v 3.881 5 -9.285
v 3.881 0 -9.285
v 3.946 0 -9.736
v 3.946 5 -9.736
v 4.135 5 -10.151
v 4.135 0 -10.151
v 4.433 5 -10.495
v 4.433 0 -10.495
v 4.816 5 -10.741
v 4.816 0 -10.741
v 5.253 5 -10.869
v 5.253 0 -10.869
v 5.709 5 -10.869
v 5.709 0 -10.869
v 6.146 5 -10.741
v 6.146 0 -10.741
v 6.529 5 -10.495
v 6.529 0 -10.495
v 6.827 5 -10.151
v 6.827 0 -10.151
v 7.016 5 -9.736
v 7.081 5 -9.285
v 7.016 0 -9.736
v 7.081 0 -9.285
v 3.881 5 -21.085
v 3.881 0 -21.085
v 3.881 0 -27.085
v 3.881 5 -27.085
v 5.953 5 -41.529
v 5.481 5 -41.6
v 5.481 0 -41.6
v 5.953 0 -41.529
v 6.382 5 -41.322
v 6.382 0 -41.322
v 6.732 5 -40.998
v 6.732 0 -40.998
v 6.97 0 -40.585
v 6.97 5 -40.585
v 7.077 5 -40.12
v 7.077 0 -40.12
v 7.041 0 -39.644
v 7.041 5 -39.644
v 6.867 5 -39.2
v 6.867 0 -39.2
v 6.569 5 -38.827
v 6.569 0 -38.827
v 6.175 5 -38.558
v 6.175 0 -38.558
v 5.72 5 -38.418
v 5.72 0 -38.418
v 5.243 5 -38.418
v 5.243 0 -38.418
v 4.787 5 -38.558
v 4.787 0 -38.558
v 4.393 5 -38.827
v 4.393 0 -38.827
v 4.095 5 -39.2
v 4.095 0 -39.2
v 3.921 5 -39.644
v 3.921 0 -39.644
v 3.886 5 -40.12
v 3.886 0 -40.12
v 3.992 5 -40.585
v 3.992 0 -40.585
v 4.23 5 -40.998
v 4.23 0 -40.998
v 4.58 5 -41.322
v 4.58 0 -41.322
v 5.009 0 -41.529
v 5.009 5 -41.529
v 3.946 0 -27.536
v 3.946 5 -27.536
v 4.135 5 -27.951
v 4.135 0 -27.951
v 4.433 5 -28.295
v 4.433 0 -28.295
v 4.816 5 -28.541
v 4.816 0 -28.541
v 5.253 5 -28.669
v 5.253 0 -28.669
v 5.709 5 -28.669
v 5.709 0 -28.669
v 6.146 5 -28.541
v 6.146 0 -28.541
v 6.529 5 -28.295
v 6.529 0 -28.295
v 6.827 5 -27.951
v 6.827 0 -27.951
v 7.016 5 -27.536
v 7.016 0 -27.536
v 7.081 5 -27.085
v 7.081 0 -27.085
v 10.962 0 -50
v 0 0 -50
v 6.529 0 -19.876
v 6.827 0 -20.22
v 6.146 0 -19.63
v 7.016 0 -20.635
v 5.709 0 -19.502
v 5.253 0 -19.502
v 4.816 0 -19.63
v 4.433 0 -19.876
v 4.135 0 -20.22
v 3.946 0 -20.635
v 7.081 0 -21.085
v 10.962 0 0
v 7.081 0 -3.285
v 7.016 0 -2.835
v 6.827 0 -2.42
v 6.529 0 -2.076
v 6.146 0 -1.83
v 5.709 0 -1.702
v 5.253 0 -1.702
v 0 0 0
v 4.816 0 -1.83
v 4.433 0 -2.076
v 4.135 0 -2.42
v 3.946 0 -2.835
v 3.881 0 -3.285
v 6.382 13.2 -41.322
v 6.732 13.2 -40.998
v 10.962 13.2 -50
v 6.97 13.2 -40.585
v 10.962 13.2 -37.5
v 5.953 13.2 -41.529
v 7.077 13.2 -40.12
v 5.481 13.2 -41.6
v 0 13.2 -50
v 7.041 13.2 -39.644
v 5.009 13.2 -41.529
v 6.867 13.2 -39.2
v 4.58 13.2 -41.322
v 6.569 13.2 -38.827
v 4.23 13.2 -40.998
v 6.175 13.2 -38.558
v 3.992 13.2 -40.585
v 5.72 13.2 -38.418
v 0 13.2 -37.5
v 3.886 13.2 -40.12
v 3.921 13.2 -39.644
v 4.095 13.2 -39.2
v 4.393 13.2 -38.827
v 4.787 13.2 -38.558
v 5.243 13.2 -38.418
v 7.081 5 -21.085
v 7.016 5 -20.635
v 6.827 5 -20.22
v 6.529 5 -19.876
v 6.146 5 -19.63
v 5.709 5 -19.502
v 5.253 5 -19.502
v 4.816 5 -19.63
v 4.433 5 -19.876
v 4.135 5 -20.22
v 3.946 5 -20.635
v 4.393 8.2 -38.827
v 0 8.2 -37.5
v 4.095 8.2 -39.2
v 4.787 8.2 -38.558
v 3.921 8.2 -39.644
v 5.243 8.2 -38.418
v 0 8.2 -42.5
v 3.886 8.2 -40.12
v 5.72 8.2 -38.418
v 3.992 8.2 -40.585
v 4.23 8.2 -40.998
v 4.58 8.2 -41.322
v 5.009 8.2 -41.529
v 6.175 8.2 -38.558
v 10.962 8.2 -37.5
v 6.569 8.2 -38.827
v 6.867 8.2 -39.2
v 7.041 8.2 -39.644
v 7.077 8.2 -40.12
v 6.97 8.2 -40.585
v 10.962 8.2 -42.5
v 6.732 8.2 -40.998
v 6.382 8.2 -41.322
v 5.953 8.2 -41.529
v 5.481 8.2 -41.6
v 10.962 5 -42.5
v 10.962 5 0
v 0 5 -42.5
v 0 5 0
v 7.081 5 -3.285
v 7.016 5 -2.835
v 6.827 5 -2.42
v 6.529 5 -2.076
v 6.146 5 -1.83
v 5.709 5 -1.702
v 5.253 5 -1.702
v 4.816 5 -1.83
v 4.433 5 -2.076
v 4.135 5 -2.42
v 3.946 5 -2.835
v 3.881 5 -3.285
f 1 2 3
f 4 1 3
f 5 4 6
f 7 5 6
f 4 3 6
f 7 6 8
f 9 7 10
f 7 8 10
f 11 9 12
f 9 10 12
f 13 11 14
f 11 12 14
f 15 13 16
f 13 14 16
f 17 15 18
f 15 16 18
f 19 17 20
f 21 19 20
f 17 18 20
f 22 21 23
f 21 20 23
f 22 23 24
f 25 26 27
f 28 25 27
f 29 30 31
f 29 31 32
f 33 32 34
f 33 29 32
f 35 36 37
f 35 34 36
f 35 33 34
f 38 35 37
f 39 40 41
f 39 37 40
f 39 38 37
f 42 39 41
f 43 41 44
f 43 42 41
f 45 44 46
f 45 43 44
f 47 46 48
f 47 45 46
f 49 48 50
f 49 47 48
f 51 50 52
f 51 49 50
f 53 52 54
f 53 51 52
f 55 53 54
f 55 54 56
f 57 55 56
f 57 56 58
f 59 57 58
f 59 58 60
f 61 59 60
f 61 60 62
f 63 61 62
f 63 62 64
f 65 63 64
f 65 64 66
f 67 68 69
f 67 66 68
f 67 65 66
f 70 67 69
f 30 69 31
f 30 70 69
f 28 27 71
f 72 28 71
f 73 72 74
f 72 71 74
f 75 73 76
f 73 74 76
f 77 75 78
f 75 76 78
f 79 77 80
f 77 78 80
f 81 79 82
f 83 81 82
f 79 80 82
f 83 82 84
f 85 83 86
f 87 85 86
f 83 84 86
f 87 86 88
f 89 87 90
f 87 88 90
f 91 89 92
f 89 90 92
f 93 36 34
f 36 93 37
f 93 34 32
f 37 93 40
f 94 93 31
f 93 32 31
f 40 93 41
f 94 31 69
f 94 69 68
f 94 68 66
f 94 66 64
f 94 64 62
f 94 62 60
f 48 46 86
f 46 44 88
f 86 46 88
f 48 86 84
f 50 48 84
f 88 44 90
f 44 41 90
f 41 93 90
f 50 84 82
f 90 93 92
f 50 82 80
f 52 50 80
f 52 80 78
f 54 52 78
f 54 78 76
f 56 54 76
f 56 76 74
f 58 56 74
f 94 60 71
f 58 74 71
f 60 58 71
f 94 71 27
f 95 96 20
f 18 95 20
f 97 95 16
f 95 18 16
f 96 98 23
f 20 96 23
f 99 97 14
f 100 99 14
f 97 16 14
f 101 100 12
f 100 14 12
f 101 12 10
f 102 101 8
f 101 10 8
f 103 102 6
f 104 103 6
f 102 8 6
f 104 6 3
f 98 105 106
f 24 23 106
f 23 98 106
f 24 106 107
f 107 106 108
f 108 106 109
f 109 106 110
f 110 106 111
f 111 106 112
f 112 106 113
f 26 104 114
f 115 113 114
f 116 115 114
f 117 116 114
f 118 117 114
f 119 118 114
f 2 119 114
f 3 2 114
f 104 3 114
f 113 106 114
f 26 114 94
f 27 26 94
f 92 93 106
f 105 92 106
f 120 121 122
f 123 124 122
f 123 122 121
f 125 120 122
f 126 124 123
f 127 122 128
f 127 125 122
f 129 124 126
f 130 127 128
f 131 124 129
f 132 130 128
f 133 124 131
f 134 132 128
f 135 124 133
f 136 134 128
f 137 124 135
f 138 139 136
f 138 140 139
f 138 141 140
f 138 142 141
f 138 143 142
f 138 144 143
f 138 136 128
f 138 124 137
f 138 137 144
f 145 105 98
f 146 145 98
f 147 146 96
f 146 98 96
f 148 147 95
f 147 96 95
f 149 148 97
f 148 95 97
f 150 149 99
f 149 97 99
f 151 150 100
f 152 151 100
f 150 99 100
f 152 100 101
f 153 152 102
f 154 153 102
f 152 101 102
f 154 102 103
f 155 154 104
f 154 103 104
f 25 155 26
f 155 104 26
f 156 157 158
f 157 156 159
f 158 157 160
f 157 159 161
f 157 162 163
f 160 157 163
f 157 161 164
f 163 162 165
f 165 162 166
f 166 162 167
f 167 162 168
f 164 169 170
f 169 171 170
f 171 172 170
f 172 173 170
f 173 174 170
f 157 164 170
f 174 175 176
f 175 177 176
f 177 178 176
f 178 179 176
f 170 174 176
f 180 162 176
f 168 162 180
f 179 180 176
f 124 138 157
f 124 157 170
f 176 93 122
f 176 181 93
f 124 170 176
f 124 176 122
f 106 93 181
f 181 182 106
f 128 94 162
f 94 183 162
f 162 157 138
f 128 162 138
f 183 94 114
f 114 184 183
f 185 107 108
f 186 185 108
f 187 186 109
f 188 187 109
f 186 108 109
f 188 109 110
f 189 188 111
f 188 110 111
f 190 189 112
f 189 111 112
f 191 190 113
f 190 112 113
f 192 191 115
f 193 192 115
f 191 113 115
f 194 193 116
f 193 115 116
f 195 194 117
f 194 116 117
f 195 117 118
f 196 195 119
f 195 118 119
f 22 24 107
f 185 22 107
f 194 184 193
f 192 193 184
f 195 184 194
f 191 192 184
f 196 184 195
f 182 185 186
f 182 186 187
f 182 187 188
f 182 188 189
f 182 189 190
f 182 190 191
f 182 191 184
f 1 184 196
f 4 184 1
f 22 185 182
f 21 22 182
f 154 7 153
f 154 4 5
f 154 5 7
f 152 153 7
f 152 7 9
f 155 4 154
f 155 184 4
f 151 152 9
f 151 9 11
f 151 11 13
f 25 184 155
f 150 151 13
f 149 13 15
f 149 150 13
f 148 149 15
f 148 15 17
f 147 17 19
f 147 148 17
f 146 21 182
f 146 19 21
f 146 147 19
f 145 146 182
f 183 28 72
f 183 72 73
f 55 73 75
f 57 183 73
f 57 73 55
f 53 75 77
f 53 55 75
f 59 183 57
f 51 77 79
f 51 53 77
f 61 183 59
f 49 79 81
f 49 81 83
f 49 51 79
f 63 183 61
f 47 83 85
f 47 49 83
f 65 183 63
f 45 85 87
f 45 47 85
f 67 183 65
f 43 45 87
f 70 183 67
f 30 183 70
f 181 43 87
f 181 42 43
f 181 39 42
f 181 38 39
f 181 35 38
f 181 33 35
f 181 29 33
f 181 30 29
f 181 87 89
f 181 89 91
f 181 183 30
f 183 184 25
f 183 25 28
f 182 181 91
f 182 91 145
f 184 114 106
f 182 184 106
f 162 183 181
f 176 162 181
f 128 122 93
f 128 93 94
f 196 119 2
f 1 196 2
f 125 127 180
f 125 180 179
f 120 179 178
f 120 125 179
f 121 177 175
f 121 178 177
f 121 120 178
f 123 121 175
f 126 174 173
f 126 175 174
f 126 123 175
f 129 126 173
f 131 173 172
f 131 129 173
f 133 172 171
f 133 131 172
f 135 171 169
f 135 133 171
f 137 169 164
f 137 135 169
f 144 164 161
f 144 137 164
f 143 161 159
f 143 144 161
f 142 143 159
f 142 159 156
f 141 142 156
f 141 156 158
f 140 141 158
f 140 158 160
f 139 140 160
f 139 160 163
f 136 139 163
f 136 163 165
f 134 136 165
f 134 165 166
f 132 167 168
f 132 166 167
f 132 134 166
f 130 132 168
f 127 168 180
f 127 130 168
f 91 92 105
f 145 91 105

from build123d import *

# Parameters (mm, degrees)
SKETCH1_W               = 10.962182916
SKETCH1_H               = 45
SKETCH1_R               = 1.25
BOSS_EXTRUDE1_DEPTH     = 5
SKETCH2_W               = 10.962182916
SKETCH2_H               = 2.5
BOSS_EXTRUDE2_DEPTH     = 8.2
SKETCH3_W               = 10.962182916
SKETCH3_H               = 5
BOSS_EXTRUDE3_DEPTH     = 5
CUT_EXTRUDE1_DEPTH      = 48.036256806
CUT_EXTRUDE1_DEPTH_BACK = 48.036256806
SKETCH4_R               = 1.6
SKETCH5_W               = 10.962182916
SKETCH5_H               = 13.2
BOSS_EXTRUDE4_DEPTH     = 5


with BuildPart() as part:
    # Sketch1 → Boss-Extrude1 (new body)
    with BuildSketch(Plane(origin=(0, 0, 0), x_dir=(1, 0, 0), z_dir=(0, 1, 0))):
        with Locations((5.481091458, 22.5)):
            Rectangle(SKETCH1_W, SKETCH1_H)
        with Locations(Location((5.481091458, 40, 0), (0, 0, 270))):
            Circle(SKETCH1_R, mode=Mode.SUBTRACT)
        with BuildLine():
            Line((7.081091458, 27.08548866), (7.081091458, 21.08548866))
            ThreePointArc((7.081091458, 21.08548866), (5.481091458, 19.48548866), (3.881091458, 21.08548866))
            Line((3.881091458, 21.08548866), (3.881091458, 27.08548866))
            ThreePointArc((3.881091458, 27.08548866), (5.481091458, 28.68548866), (7.081091458, 27.08548866))
        make_face(mode=Mode.SUBTRACT)
        with BuildLine():
            Line((3.881091458, 3.28548866), (3.881091458, 9.28548866))
            ThreePointArc((3.881091458, 9.28548866), (5.481091458, 10.88548866), (7.081091458, 9.28548866))
            Line((7.081091458, 9.28548866), (7.081091458, 3.28548866))
            ThreePointArc((7.081091458, 3.28548866), (5.481091458, 1.68548866), (3.881091458, 3.28548866))
        make_face(mode=Mode.SUBTRACT)
    extrude(amount=BOSS_EXTRUDE1_DEPTH)

    # Sketch2 → Boss-Extrude2 (add)
    with BuildSketch(Plane(origin=(0, 5, 0), x_dir=(1, 0, 0), z_dir=(0, 1, 0))):
        with Locations((5.481091458, 43.75)):
            Rectangle(SKETCH2_W, SKETCH2_H)
    extrude(amount=BOSS_EXTRUDE2_DEPTH)

    # Sketch3 → Boss-Extrude3 (add)
    with BuildSketch(Plane.XY.offset(-42.5)):
        with Locations((5.481091458, 10.7)):
            Rectangle(SKETCH3_W, SKETCH3_H)
    extrude(amount=BOSS_EXTRUDE3_DEPTH)

    # Sketch4 → Cut-Extrude1 (cut, two sides: drawn at the far end of the back side and taken through both)
    with BuildSketch(Plane.XZ.offset(-8.2).offset(-CUT_EXTRUDE1_DEPTH_BACK)):
        with Locations(Location((5.481091458, -40, 0), (0, 0, 270))):
            Circle(SKETCH4_R)
    extrude(amount=CUT_EXTRUDE1_DEPTH + CUT_EXTRUDE1_DEPTH_BACK, mode=Mode.SUBTRACT)

    # Sketch5 → Boss-Extrude4 (add)
    with BuildSketch(Plane(origin=(0, 0, -45), x_dir=(-1, 0, 0), z_dir=(0, 0, -1))):
        with Locations((-5.481091458, 6.6)):
            Rectangle(SKETCH5_W, SKETCH5_H)
    extrude(amount=BOSS_EXTRUDE4_DEPTH)


solid = part.part
